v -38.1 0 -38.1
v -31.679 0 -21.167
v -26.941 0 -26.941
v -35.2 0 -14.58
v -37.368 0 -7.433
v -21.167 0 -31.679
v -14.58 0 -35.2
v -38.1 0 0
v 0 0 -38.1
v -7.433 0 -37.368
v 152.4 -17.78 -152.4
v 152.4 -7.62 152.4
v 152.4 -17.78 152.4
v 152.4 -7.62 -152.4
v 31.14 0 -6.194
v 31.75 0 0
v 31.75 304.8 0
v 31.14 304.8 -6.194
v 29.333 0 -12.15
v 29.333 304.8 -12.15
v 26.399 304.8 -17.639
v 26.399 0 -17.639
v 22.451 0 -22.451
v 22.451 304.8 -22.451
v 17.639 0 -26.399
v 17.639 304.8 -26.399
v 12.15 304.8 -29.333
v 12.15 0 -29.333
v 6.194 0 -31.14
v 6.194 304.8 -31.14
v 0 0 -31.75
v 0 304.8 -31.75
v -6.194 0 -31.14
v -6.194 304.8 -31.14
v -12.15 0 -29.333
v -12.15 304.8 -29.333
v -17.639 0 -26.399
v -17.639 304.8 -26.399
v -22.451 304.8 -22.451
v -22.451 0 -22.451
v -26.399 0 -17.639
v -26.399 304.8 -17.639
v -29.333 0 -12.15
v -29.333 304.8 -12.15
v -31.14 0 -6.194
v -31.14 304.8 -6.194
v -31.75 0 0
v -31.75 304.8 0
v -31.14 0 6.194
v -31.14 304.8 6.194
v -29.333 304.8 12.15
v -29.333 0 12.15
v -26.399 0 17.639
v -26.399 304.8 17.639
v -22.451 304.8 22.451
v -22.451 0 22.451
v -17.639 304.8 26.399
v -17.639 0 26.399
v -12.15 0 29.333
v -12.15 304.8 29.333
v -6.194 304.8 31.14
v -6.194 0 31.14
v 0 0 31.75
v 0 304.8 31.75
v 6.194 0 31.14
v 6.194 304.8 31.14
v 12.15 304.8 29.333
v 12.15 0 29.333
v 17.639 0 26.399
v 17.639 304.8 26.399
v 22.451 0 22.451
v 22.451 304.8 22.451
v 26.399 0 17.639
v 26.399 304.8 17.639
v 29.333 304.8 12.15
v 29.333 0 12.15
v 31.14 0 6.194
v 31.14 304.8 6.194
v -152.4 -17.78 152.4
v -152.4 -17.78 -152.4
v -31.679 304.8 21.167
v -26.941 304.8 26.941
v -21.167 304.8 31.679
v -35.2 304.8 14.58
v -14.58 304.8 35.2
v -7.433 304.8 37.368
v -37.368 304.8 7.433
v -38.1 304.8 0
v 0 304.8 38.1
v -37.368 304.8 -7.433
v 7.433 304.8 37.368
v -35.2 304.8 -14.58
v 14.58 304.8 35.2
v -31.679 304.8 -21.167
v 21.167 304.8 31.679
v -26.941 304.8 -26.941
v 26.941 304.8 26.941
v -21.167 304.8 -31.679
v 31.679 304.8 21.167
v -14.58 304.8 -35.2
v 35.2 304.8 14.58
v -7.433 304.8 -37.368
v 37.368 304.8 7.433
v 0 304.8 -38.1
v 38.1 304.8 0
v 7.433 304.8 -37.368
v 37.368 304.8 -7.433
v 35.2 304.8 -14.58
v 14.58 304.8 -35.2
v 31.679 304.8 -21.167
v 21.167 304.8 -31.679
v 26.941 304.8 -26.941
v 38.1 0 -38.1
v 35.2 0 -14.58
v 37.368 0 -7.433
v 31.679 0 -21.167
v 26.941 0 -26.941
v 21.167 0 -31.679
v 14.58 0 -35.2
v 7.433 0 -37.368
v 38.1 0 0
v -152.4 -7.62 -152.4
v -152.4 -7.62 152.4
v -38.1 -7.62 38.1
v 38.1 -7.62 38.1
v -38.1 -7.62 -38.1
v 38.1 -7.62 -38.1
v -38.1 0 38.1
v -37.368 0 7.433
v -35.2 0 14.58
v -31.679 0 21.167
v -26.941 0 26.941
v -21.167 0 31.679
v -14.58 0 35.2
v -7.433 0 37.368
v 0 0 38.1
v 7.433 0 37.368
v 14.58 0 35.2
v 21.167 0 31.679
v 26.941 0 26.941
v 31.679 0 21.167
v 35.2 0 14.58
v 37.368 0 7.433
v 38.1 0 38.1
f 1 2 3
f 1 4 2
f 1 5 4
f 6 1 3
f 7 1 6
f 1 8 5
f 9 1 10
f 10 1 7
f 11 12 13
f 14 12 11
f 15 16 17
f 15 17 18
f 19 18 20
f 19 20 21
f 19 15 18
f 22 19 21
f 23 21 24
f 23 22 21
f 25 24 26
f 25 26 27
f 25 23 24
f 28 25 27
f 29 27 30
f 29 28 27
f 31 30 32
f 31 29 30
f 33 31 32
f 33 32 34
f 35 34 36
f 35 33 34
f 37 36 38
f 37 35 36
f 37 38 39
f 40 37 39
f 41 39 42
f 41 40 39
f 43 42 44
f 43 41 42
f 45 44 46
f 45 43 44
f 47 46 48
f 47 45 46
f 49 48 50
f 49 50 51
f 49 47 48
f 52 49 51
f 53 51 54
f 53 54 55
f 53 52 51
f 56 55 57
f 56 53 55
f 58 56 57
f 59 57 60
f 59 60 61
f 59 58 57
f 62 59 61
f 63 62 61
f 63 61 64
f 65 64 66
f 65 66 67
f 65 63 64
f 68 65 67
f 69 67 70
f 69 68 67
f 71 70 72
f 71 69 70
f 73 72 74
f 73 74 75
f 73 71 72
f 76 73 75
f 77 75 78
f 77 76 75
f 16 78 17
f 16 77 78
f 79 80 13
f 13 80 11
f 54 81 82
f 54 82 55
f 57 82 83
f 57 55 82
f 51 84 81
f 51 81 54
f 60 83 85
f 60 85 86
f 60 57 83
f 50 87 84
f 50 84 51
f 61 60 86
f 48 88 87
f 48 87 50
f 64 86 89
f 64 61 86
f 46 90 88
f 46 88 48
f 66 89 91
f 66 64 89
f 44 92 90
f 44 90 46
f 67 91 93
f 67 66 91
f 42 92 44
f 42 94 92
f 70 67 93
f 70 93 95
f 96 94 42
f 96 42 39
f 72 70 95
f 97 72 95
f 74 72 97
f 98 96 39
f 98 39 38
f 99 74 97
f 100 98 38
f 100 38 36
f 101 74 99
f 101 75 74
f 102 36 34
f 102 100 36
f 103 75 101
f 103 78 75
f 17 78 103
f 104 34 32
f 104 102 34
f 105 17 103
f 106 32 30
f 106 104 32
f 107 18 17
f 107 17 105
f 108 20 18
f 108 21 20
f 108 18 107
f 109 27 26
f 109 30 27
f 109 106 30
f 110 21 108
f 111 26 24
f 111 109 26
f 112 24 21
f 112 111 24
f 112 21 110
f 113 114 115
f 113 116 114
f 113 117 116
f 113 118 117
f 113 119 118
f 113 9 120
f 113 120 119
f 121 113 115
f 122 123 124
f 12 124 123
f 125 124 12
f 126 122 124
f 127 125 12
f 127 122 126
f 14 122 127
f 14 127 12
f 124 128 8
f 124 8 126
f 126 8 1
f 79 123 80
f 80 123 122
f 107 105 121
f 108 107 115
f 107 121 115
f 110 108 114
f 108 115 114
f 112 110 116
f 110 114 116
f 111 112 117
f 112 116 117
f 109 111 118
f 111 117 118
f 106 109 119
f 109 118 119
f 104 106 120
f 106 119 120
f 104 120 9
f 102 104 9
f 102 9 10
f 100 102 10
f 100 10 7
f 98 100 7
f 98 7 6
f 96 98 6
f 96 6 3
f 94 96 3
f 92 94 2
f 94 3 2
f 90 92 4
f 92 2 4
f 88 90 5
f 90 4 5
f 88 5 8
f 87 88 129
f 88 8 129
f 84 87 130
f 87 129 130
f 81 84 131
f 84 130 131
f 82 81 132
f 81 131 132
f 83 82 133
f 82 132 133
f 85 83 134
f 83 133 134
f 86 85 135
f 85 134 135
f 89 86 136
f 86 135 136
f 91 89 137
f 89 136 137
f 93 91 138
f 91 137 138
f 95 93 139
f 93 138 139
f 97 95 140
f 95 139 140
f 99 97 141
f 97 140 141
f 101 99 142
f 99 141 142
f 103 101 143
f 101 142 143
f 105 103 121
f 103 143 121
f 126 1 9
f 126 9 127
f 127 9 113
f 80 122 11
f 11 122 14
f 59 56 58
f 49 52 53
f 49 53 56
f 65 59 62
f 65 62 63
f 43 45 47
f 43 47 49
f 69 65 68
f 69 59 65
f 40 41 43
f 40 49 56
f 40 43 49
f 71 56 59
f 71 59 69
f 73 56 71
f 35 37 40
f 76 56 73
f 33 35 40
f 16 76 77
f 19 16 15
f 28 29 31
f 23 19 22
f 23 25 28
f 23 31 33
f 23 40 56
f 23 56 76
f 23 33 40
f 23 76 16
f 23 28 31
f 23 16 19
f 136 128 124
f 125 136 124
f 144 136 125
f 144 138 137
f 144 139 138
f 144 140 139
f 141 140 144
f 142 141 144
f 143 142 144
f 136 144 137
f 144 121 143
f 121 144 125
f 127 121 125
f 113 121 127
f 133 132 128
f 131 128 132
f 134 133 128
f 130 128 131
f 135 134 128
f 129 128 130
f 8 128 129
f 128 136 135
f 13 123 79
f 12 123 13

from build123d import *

# Parameters (mm, degrees)
SKETCH1_R           = 38.1
SKETCH1_R_2         = 31.75
BOSS_EXTRUDE1_DEPTH = 304.8
SKETCH2_W           = 76.2
SKETCH2_H           = 76.2
BOSS_EXTRUDE2_DEPTH = 7.62
SKETCH4_W           = 304.8
SKETCH4_H           = 304.8
BOSS_EXTRUDE4_DEPTH = 10.16


with BuildPart() as part:
    # Sketch1 → Boss-Extrude1 (new body)
    with BuildSketch(Plane(origin=(0, 0, 0), x_dir=(1, 0, 0), z_dir=(0, 1, 0))):
        Circle(SKETCH1_R)
        Circle(SKETCH1_R_2, mode=Mode.SUBTRACT)
    extrude(amount=BOSS_EXTRUDE1_DEPTH)

    # Sketch2 → Boss-Extrude2 (add)
    with BuildSketch(Plane(origin=(0, 0, 0), x_dir=(1, 0, 0), z_dir=(0, 1, 0))):
        Rectangle(SKETCH2_W, SKETCH2_H)
    extrude(amount=-BOSS_EXTRUDE2_DEPTH)

    # Sketch4 → Boss-Extrude4 (add)
    with BuildSketch(Plane(origin=(0, -7.62, 0), x_dir=(1, 0, 0), z_dir=(0, 1, 0))):
        Rectangle(SKETCH4_W, SKETCH4_H)
    extrude(amount=-BOSS_EXTRUDE4_DEPTH)


solid = part.part
